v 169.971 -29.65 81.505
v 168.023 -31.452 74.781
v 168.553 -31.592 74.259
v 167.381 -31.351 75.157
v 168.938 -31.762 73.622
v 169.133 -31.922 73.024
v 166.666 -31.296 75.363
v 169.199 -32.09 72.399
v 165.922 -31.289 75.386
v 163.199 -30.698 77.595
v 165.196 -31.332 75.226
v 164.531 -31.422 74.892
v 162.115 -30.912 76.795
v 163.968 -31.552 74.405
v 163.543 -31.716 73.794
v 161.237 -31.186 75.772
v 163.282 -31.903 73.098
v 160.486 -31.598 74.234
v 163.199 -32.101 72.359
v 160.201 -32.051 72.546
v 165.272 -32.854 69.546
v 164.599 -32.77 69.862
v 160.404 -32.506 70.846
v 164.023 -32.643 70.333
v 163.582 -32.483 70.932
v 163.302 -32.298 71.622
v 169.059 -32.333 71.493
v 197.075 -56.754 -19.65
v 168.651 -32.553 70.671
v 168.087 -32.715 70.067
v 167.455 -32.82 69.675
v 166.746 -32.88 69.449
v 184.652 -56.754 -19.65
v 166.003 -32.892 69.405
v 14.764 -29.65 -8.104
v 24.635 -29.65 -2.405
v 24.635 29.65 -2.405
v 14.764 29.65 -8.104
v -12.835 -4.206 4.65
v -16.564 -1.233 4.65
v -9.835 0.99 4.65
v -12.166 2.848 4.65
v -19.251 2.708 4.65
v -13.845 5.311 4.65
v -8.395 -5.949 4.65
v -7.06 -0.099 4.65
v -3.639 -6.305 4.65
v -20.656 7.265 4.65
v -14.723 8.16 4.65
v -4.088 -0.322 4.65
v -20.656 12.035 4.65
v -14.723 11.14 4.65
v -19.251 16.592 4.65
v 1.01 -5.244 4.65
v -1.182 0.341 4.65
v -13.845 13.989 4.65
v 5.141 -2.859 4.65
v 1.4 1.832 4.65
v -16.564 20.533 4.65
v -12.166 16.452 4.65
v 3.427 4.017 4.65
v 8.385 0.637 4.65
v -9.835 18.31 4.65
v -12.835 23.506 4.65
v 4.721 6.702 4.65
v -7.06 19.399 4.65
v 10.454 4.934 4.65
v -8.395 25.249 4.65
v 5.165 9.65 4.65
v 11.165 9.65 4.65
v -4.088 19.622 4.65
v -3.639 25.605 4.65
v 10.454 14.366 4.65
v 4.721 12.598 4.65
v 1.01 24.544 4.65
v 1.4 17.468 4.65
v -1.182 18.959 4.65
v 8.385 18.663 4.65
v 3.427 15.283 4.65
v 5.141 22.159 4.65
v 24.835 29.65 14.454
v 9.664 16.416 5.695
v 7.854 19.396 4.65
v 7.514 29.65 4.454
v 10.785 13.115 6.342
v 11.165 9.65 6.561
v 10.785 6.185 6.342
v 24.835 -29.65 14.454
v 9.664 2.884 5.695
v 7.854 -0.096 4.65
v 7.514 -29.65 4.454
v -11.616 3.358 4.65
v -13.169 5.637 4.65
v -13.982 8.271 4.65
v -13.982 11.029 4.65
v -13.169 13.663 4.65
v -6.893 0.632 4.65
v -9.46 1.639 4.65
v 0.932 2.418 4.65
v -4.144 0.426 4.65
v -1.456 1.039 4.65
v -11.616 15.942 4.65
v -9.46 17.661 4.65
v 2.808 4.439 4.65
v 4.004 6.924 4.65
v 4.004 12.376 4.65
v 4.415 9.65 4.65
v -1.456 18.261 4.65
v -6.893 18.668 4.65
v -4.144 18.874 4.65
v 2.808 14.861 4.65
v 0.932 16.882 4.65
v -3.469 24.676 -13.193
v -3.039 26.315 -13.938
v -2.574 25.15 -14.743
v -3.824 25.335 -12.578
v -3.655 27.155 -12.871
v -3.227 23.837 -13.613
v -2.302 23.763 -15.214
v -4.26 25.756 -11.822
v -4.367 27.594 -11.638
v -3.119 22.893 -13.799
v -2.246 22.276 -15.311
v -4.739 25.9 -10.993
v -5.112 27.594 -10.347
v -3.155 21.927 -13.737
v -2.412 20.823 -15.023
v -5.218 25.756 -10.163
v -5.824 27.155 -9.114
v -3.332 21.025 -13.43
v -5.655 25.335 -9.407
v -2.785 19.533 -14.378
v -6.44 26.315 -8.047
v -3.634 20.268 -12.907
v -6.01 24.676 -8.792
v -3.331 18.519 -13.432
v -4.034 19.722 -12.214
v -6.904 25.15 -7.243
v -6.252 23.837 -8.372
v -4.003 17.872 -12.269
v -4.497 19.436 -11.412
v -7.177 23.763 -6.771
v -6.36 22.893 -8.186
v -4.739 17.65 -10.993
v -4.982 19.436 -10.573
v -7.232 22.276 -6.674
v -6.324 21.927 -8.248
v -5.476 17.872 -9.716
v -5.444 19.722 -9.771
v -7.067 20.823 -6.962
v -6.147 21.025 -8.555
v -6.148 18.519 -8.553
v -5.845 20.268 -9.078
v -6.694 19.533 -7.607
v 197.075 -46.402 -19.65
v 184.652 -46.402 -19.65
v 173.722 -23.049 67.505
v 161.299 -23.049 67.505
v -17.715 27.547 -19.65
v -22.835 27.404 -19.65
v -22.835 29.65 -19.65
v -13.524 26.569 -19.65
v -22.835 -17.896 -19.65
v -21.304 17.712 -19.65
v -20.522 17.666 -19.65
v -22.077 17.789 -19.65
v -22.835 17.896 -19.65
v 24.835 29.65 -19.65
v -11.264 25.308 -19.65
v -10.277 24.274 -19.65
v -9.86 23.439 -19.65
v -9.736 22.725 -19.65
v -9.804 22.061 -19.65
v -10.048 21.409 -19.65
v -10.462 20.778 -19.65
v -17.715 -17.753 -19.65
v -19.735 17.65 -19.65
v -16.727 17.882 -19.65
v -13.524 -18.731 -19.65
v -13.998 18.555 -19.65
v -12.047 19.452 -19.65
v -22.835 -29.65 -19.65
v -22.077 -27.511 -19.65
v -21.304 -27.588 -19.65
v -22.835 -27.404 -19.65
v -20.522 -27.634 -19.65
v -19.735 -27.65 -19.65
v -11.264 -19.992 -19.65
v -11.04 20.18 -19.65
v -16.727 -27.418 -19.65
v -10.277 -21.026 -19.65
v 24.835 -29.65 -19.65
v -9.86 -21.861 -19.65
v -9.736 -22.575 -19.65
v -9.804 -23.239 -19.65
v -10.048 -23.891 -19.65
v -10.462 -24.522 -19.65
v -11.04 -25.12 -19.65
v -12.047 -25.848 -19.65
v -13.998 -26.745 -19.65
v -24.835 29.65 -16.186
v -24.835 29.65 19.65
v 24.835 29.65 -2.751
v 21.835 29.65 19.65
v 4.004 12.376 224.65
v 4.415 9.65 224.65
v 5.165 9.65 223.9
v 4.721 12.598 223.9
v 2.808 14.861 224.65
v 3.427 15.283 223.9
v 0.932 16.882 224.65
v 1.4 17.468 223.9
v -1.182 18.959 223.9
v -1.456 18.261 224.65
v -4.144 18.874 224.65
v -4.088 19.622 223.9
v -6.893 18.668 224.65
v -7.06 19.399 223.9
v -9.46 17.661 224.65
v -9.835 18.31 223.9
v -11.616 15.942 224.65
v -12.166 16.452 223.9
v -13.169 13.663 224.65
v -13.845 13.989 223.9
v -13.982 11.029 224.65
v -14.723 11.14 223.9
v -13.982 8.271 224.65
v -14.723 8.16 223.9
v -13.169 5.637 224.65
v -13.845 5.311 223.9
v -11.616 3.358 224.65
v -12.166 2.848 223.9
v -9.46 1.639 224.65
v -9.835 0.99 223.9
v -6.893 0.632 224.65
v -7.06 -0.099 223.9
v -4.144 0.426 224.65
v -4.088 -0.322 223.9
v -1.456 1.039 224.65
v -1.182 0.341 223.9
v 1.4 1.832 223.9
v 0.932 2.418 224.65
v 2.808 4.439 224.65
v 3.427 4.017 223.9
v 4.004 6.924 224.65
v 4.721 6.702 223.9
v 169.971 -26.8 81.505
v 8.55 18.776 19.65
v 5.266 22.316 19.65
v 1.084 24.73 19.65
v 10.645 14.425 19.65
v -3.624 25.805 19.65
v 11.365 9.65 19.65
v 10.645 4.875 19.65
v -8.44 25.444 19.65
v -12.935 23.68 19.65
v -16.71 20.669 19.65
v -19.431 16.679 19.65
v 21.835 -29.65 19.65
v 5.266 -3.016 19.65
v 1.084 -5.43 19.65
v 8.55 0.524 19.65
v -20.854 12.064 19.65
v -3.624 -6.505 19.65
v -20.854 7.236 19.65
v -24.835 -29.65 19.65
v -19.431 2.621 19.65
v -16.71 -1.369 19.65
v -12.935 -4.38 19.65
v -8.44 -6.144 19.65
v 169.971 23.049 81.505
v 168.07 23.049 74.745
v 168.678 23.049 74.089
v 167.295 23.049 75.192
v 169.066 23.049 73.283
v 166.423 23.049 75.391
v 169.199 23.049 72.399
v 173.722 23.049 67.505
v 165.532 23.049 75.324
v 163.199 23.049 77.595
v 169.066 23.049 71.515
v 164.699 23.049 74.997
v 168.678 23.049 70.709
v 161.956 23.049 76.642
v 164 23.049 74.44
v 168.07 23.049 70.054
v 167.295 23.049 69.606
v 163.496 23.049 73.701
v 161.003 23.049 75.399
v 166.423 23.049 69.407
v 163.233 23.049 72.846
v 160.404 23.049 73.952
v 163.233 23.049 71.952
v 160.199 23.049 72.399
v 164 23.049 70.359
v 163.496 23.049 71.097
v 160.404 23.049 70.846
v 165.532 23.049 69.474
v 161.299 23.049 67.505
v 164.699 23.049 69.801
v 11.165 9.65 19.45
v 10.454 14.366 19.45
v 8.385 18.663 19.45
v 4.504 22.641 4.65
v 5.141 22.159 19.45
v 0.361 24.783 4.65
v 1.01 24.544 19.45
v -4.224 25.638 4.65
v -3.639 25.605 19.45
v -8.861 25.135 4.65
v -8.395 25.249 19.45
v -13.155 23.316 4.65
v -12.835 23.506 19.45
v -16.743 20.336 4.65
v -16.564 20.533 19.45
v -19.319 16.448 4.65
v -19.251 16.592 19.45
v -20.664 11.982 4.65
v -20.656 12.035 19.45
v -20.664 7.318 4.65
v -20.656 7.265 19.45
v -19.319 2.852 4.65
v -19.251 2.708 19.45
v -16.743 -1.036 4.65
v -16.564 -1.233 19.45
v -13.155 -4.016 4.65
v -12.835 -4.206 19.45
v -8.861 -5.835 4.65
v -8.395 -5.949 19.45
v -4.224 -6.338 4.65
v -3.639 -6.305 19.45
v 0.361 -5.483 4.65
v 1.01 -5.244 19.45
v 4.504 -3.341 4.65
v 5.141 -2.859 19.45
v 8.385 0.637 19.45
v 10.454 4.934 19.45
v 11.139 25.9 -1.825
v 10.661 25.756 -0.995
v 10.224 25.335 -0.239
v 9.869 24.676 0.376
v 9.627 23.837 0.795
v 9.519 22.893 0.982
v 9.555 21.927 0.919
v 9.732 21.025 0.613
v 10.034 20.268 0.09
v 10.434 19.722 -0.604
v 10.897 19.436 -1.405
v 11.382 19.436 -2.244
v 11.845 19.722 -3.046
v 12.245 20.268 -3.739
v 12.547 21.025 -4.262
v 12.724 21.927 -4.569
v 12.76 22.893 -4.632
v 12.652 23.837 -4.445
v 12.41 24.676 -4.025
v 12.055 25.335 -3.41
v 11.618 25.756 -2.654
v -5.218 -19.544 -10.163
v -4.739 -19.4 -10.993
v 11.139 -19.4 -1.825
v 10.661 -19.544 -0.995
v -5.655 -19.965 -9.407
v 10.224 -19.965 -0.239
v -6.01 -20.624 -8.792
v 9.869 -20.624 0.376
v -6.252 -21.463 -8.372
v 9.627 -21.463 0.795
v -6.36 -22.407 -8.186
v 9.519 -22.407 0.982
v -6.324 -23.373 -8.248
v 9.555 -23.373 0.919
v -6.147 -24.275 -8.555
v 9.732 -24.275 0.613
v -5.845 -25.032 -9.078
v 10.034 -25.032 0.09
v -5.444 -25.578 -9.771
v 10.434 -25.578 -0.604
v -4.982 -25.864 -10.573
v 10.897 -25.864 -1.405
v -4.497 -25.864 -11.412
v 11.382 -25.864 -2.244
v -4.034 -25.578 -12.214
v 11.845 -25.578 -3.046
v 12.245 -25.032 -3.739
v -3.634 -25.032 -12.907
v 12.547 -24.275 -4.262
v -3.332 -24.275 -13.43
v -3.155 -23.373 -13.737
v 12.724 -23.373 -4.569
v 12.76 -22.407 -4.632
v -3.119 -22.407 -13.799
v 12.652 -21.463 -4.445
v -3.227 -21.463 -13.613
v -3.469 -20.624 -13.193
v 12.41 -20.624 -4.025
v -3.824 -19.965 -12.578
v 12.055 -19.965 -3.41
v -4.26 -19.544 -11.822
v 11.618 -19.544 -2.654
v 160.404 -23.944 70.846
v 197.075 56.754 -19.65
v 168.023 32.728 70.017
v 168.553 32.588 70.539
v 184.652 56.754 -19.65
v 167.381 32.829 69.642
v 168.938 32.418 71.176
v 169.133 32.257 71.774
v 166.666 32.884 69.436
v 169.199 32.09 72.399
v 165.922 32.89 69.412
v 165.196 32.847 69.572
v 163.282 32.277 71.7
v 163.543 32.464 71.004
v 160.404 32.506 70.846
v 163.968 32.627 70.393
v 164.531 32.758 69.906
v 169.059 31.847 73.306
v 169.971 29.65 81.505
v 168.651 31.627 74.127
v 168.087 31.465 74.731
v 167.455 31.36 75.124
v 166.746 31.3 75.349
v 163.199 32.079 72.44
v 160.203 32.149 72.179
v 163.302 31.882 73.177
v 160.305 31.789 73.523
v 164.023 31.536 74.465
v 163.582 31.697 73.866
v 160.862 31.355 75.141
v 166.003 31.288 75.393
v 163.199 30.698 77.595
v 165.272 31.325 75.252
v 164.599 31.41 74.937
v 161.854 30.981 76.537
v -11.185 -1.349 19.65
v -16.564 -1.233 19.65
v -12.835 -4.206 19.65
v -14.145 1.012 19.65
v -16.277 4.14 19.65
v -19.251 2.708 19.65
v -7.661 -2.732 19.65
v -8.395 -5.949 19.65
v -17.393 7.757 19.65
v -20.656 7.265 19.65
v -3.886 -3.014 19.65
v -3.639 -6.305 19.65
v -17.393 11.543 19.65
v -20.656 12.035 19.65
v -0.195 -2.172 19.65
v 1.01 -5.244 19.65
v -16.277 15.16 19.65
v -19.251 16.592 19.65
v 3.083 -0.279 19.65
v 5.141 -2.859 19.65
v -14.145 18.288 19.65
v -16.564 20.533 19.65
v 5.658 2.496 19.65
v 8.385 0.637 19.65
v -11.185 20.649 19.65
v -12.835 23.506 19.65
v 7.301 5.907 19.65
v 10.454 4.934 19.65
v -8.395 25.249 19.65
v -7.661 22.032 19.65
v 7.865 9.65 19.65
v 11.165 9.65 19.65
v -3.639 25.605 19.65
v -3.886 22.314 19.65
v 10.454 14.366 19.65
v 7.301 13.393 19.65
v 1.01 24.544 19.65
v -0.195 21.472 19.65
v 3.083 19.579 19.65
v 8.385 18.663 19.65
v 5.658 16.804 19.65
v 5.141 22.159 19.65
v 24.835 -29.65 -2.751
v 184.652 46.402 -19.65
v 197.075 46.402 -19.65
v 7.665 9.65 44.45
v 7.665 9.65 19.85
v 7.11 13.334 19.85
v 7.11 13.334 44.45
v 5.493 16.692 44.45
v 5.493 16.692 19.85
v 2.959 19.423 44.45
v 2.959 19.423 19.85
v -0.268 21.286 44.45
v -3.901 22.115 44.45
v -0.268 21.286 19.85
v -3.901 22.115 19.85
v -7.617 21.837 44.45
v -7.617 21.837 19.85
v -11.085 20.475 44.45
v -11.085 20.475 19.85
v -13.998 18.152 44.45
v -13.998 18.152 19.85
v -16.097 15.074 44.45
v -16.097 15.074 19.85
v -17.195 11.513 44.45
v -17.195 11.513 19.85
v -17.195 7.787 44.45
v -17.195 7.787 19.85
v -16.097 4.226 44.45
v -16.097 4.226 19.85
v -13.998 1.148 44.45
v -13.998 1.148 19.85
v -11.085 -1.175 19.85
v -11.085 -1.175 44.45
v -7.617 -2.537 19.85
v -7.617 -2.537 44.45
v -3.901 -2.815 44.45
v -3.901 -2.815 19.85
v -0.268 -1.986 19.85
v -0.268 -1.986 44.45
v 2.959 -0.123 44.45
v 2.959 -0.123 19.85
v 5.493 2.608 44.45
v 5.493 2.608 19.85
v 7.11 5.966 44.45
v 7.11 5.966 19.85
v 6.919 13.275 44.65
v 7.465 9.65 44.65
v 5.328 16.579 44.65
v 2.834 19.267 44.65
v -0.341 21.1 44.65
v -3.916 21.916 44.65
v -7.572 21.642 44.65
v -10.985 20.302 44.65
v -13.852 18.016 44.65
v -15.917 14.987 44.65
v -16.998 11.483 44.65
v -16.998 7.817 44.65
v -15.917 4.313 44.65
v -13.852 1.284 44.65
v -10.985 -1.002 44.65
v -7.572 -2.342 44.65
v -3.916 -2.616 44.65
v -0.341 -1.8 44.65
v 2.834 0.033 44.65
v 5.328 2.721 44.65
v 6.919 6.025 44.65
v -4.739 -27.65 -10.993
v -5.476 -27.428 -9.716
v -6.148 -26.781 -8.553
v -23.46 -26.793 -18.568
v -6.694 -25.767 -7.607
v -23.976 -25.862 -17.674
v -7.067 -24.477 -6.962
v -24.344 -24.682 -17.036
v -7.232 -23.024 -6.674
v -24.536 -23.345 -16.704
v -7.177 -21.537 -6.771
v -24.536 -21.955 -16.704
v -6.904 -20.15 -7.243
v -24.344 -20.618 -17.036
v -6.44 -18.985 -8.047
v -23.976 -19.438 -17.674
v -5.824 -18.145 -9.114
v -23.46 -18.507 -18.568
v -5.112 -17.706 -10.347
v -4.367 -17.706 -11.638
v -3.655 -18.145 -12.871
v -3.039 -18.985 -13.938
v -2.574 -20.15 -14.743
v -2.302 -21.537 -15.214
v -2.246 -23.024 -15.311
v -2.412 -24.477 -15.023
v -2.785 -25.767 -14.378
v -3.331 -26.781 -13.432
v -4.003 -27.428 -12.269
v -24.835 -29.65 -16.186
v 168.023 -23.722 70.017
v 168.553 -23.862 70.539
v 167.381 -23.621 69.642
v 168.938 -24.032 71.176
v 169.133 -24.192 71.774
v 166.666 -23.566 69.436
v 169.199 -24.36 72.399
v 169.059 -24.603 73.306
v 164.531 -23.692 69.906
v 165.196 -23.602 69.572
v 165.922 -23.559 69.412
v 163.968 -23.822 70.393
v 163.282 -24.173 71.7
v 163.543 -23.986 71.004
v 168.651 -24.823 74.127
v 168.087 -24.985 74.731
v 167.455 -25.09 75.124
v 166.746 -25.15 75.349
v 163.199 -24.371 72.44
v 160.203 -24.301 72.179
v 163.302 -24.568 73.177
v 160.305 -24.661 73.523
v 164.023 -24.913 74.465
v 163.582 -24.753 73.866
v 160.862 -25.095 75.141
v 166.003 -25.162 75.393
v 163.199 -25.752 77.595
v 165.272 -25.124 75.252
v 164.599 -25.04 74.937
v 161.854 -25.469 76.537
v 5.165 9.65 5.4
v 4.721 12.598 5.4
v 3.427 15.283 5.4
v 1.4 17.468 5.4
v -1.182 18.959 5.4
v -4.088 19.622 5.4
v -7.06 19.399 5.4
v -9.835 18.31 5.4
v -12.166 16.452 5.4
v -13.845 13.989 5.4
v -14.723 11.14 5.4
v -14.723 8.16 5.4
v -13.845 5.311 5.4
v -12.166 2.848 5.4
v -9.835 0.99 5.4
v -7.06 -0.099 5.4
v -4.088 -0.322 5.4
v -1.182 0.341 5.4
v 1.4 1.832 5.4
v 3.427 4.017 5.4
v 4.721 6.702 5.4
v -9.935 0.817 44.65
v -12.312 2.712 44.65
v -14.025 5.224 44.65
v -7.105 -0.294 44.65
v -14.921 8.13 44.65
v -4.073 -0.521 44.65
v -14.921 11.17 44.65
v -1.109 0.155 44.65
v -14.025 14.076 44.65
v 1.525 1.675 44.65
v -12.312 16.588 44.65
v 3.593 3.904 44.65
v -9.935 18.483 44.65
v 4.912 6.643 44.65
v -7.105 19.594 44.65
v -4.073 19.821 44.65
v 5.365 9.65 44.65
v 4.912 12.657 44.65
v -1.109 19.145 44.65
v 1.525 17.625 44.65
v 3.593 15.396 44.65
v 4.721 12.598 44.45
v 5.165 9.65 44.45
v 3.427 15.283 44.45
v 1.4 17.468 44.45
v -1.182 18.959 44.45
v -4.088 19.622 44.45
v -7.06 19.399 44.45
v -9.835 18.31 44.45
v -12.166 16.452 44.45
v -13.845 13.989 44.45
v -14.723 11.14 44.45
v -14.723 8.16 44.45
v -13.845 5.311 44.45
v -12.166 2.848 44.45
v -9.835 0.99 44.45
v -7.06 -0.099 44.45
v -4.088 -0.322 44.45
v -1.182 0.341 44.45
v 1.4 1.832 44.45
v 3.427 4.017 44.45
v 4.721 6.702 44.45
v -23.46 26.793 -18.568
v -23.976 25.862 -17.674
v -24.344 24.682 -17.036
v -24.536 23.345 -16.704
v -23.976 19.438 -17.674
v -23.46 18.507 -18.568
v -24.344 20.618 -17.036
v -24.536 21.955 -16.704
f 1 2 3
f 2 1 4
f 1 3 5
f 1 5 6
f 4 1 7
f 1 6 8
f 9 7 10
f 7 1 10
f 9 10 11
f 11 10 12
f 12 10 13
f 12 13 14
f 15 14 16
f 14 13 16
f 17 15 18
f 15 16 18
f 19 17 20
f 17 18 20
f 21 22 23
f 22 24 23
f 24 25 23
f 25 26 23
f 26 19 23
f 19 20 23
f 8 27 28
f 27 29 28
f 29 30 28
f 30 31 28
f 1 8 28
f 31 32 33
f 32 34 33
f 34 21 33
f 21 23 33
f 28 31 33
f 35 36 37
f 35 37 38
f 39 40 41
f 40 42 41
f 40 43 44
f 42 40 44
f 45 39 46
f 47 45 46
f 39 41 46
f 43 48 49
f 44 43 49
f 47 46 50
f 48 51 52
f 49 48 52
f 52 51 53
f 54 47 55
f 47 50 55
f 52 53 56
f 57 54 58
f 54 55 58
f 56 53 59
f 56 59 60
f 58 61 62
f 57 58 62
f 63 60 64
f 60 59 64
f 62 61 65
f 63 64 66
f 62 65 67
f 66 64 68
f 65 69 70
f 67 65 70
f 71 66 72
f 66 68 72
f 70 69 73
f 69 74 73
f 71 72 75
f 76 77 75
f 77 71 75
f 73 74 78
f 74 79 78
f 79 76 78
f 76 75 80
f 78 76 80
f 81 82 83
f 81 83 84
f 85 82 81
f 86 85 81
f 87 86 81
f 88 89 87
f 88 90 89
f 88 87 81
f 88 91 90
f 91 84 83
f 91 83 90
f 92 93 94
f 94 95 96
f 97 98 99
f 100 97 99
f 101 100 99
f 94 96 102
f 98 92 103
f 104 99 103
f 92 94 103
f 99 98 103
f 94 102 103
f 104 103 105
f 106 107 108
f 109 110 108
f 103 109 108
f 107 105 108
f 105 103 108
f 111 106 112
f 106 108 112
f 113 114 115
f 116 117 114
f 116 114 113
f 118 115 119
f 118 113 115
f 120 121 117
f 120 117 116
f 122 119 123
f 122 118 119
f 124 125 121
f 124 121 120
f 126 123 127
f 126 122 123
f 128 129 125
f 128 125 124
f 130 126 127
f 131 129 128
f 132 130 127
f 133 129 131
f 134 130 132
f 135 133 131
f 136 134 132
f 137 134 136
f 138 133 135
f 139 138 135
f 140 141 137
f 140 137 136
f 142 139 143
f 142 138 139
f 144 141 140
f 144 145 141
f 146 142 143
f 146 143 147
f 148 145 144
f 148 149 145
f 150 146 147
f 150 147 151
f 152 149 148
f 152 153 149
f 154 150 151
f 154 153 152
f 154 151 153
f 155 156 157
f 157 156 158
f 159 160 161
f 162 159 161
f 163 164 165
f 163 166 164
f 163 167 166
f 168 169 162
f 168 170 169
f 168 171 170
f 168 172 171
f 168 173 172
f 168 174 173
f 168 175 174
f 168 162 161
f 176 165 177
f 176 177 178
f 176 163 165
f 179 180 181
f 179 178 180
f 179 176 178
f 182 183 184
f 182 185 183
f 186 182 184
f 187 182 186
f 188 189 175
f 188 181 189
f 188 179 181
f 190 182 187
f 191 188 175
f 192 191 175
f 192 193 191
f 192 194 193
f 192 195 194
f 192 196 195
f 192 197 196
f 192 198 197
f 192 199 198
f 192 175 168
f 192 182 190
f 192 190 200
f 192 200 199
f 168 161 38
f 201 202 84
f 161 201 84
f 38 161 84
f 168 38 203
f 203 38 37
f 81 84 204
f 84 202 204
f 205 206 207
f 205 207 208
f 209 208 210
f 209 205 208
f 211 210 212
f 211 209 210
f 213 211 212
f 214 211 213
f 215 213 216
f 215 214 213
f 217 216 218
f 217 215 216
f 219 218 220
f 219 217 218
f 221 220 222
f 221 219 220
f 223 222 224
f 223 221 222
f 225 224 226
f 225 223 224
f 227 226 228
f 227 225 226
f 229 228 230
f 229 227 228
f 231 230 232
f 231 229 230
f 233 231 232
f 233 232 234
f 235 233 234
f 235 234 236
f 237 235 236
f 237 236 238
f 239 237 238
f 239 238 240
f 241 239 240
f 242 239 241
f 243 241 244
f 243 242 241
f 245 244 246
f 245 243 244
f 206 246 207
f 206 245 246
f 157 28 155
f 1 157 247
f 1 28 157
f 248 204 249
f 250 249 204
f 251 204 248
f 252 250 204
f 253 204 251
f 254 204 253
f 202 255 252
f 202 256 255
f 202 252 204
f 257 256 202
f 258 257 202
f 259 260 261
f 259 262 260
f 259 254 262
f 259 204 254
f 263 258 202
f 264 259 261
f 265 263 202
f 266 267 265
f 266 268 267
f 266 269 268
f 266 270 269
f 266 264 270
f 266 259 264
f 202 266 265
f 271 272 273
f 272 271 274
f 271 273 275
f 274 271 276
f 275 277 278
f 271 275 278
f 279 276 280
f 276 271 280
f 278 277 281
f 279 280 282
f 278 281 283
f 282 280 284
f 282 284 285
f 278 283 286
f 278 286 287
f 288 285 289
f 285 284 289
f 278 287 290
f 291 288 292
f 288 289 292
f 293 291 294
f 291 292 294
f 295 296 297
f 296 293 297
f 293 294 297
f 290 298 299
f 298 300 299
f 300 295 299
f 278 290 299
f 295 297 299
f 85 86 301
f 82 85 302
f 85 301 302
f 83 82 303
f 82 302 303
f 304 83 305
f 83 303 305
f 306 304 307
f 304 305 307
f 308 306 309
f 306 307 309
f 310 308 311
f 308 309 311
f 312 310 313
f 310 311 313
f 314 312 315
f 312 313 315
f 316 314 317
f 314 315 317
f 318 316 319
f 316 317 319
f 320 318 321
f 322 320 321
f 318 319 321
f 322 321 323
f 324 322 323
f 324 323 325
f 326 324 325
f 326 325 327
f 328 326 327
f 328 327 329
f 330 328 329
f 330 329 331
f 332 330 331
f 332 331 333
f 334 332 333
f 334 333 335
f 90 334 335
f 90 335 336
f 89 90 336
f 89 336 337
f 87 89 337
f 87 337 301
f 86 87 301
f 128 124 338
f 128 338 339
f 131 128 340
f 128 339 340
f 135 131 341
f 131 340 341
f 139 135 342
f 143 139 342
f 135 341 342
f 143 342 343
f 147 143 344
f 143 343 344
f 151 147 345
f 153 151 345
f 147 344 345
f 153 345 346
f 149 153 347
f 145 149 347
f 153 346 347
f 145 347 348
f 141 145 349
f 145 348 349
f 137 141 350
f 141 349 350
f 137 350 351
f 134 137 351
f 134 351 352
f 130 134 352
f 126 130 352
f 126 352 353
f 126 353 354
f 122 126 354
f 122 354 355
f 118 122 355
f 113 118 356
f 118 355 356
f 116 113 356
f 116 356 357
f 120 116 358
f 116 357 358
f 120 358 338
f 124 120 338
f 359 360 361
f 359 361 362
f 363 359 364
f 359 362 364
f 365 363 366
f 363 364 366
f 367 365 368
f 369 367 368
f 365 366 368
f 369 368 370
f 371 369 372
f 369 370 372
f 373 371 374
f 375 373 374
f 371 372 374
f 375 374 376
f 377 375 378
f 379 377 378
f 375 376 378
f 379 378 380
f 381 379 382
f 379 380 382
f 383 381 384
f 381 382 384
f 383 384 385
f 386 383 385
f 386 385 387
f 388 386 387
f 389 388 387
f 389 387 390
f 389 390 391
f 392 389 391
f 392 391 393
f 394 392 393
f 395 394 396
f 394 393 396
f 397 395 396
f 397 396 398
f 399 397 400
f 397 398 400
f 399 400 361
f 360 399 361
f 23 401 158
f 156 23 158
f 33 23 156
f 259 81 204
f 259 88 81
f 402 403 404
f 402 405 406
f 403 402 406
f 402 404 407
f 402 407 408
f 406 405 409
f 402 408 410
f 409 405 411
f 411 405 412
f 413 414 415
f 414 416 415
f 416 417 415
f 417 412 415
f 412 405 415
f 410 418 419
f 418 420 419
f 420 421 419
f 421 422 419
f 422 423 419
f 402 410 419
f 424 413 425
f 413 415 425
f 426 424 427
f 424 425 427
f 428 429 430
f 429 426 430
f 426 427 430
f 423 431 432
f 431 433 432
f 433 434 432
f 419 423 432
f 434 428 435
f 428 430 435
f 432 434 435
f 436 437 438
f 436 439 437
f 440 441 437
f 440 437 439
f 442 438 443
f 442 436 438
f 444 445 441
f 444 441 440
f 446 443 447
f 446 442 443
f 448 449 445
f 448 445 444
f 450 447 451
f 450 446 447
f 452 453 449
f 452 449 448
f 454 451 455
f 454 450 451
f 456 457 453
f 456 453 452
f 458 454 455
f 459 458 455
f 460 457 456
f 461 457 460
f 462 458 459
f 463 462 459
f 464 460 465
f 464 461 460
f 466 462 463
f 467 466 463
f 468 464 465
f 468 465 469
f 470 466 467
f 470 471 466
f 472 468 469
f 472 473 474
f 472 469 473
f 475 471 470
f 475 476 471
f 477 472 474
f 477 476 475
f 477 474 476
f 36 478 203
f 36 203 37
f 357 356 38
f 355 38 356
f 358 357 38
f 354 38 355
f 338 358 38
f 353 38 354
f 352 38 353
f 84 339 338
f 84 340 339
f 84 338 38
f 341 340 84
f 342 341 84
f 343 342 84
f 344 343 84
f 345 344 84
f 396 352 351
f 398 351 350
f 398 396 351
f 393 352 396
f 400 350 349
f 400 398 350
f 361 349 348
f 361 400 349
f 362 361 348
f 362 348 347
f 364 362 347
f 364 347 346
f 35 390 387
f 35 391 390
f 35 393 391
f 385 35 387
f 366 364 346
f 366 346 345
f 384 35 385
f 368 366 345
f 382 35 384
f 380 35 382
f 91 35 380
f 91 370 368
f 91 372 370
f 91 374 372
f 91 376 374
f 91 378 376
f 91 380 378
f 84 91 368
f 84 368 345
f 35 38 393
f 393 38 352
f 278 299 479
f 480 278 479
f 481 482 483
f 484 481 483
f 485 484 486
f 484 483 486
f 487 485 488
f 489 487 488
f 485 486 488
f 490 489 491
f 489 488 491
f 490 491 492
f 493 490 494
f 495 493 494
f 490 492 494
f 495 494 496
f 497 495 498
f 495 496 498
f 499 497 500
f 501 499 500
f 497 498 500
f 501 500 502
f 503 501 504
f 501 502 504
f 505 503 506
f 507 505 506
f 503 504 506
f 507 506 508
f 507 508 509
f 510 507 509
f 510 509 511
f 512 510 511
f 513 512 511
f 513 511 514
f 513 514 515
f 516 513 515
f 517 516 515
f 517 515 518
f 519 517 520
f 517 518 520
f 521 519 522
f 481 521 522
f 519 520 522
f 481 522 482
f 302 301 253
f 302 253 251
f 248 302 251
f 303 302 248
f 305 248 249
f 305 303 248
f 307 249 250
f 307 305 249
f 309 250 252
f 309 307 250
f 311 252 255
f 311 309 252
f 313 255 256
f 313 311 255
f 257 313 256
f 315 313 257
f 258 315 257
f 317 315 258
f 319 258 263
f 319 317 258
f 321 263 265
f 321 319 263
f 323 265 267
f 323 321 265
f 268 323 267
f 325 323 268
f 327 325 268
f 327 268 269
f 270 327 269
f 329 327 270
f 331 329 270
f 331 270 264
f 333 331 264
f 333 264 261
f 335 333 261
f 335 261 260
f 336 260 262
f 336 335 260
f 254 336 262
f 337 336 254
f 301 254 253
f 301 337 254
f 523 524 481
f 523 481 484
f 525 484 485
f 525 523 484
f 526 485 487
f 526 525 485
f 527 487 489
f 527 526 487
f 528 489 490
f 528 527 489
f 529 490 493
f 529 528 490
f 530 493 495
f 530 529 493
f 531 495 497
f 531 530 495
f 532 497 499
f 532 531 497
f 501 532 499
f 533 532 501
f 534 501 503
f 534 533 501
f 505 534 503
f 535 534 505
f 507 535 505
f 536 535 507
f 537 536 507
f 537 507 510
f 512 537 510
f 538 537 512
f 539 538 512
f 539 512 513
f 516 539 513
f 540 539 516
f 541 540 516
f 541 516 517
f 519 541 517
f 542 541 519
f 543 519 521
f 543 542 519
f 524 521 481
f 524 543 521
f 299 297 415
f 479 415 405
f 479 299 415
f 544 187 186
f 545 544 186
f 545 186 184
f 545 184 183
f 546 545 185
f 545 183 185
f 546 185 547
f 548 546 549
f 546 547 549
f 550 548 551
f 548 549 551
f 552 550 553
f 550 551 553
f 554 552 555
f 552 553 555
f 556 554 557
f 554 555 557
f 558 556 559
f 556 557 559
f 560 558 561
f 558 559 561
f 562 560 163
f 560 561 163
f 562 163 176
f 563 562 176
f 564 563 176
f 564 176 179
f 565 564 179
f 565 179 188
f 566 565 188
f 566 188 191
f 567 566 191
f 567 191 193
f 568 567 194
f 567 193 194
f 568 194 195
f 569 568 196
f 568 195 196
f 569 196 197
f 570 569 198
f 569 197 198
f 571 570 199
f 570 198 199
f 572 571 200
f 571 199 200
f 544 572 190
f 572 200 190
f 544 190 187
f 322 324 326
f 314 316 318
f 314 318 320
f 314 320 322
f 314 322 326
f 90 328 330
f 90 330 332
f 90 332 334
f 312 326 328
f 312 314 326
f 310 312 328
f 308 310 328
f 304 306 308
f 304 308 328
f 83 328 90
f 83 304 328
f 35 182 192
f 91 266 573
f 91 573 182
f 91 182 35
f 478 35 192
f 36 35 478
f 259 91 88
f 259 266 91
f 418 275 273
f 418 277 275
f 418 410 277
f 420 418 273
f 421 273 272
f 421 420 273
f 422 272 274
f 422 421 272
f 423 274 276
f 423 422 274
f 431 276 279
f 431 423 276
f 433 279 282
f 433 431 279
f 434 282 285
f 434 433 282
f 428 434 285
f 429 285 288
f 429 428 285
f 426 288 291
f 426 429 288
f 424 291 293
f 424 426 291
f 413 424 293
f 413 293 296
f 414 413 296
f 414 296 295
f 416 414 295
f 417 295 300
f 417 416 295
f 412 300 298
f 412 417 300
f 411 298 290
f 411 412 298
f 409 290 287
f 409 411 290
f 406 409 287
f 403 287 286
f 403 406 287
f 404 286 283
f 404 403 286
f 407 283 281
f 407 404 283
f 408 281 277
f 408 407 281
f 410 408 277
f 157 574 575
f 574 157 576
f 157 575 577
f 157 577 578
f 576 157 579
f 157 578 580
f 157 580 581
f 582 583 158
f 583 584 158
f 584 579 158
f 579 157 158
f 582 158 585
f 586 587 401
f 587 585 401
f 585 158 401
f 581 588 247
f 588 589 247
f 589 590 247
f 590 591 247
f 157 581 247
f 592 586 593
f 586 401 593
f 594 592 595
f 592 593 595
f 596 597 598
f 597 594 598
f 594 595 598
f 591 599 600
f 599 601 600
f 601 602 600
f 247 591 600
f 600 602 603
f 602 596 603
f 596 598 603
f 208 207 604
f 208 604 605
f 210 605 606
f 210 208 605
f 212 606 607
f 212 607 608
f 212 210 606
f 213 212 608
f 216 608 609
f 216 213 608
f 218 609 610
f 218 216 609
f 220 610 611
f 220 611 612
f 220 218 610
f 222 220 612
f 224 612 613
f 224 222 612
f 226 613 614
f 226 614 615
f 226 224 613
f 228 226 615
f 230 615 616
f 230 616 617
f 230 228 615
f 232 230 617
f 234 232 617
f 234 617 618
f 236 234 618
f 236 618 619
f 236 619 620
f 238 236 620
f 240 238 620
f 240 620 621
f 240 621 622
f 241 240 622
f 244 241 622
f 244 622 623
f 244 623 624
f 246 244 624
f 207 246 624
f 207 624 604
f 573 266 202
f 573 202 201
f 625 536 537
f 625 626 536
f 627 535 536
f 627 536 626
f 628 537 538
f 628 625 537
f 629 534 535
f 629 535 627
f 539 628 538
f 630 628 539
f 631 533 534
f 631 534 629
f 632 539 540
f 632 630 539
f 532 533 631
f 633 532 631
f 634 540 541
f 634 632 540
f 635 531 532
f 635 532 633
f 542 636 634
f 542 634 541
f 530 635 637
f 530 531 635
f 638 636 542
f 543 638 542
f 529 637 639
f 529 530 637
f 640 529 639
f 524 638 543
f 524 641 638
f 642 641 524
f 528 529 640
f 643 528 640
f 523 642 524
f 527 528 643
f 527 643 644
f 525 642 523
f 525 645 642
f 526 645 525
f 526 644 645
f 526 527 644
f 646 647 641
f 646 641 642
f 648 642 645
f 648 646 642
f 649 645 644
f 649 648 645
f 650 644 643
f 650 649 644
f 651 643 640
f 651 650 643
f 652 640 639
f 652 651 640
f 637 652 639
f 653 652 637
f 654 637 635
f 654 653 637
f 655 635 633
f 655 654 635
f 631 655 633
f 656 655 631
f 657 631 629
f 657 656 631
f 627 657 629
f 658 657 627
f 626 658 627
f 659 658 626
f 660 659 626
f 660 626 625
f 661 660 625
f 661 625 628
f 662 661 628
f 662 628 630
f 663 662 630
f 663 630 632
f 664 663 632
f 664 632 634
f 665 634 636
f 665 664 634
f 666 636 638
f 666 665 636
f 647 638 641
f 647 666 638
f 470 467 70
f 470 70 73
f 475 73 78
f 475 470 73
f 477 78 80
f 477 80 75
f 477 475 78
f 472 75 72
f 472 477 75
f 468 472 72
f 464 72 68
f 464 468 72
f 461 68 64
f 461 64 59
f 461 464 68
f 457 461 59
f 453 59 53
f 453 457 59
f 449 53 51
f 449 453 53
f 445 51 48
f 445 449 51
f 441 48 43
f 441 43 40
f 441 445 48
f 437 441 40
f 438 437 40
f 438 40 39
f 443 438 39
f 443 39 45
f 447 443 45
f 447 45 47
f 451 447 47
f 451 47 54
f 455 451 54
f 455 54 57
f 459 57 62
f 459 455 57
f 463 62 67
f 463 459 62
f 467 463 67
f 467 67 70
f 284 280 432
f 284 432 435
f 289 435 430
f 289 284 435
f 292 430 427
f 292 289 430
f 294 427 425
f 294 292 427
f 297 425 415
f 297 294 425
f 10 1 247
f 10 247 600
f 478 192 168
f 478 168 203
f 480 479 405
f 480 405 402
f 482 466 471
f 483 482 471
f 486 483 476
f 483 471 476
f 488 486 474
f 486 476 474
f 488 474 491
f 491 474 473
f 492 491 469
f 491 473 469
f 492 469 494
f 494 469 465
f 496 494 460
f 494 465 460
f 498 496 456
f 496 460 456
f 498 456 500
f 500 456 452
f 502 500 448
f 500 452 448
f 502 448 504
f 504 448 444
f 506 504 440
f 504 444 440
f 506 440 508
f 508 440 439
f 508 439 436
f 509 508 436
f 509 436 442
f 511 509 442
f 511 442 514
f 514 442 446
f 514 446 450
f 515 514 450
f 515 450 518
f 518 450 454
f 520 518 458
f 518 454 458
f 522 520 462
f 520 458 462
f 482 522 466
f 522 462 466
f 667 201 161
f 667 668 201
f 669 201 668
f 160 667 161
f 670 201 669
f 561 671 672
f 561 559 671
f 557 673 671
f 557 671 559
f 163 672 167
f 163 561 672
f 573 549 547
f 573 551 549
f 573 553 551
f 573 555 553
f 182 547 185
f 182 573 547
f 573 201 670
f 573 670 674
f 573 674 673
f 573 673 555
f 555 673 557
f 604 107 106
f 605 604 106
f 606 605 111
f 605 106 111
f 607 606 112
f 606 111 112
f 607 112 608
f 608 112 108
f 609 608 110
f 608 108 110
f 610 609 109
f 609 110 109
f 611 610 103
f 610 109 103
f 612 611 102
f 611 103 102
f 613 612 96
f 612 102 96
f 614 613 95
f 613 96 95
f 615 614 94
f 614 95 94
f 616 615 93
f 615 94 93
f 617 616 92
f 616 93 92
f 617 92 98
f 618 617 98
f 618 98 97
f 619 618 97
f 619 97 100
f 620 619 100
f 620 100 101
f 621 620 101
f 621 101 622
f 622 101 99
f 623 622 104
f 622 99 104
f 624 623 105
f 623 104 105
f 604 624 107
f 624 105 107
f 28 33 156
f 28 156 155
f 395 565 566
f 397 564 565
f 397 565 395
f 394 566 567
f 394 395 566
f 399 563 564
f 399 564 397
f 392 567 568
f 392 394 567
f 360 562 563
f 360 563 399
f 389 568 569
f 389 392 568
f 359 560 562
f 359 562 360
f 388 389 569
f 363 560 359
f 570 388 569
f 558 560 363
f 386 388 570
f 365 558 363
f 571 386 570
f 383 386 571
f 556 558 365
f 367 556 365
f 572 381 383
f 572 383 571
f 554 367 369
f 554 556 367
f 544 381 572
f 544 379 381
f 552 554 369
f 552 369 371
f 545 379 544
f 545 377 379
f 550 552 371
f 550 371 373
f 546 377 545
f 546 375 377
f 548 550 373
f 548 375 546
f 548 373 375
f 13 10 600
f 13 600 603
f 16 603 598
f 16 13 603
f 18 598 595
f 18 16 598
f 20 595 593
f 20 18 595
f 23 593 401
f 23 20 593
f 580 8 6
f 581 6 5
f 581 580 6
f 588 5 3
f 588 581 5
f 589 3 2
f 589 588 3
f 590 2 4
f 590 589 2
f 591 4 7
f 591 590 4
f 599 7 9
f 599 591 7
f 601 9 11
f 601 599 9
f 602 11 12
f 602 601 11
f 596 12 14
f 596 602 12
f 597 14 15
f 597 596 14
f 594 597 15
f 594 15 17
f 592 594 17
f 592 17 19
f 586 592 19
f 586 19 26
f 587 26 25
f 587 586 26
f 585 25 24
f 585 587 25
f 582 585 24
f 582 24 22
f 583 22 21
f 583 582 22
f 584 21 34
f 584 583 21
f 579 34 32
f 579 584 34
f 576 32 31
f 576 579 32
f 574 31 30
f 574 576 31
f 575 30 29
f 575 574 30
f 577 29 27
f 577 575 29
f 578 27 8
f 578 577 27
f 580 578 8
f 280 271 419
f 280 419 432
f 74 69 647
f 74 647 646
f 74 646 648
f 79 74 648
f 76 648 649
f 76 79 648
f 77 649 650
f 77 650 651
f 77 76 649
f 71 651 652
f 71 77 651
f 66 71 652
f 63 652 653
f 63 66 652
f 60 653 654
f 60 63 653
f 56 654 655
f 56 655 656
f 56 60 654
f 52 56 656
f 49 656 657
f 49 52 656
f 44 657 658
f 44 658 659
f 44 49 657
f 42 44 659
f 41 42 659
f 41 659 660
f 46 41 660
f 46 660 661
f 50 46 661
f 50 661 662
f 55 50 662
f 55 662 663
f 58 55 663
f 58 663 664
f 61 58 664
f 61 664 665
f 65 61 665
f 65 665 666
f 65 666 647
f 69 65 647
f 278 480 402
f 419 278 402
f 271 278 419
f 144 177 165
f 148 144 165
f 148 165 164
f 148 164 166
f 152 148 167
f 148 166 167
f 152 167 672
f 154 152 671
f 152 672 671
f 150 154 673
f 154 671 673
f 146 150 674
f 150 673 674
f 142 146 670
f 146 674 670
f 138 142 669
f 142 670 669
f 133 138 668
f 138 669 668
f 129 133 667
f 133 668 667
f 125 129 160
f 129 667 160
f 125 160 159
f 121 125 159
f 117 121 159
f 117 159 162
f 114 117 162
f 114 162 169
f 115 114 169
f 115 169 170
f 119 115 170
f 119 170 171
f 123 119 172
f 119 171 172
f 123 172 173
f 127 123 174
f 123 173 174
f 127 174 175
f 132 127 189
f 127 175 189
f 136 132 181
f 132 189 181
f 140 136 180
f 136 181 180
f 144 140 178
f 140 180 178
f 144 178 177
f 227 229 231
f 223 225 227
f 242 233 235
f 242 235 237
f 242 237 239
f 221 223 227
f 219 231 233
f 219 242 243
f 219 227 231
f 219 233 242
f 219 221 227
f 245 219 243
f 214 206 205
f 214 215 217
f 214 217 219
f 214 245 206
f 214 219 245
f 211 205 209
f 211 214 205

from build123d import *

# Parameters (mm, degrees)
F1_DEPTH       = 29.65
F3_D           = 6.5
F3_CBORE_D     = 10
F3_CBORE_DEPTH = 20
F4_R           = 16
F4_R_2         = 12.5
F4_R_3         = 10
F4_R_4         = 3
F5_DEPTH       = 15
F6_DEPTH       = 15
F7_DEPTH       = 25
F8_SIZE        = 0.2
F8_2_SIZE      = 0.2
F9_DEPTH       = 205
F9_DEPTH_BACK  = 15
F10_SIZE       = 0.75
F11_R          = 3
F12_DEPTH      = 60
F14_DEPTH      = 197.0761949335


with BuildPart() as f1:
    # F0 (on Front) → F1 (new body, symmetric)
    with BuildSketch(Plane.XZ):
        Polygon((24.835, 14.4538475773), (21.835, 19.65), (-24.835, 19.65), (-24.835, -16.1858983849), (-22.835, -19.65), (24.835, -19.65), (24.835, -2.7511904446), (24.635, -2.404780283), (14.7644919243, -8.1035207776), (7.5144919243, 4.4538475773), align=None)
    extrude(amount=F1_DEPTH, both=True)

    # F3 (through all)
    with Locations(Plane(origin=(-25.6349495922, 0, -14.8003450477), x_dir=(0, -1, 0), z_dir=(-0.8660254038, 0, -0.5))):
        with Locations((-22.65, -7.1501008156), (22.65, -7.1501008156)):
            CounterBoreHole(F3_D / 2, F3_CBORE_D / 2, F3_CBORE_DEPTH)

    # F4 (on face) → F5 (cut)
    with BuildSketch(Plane.XY.offset(19.65)):
        with Locations((-4.835, 9.65)):
            Circle(F4_R)
        with Locations((-4.835, 9.65)):
            Circle(F4_R_2, mode=Mode.SUBTRACT)
        with Locations((-4.835, 9.65)):
            Circle(F4_R_2)
        with Locations((-4.835, 9.65)):
            Circle(F4_R_3, mode=Mode.SUBTRACT)
        with Locations((-4.835, 9.65)):
            Circle(F4_R_3)
        with Locations((-4.835, 9.65)):
            Circle(F4_R_4, mode=Mode.SUBTRACT)
        with Locations((-4.835, 9.65)):
            Circle(F4_R_4)
    extrude(amount=-F5_DEPTH, mode=Mode.SUBTRACT)

    # F8#2
    f8_2_edges = [f1.edges().sort_by_distance(p)[0] for p in [
        (-20.835, 9.65, 19.65),
    ]]
    chamfer(f8_2_edges, length=F8_2_SIZE)


with BuildPart() as f6:
    # F4 (on face) → F6 (new body)
    with BuildSketch(Plane.XY.offset(19.65)):
        with Locations((-4.835, 9.65)):
            Circle(F4_R)
        with Locations((-4.835, 9.65)):
            Circle(F4_R_2, mode=Mode.SUBTRACT)
        with Locations((-4.835, 9.65)):
            Circle(F4_R_2)
        with Locations((-4.835, 9.65)):
            Circle(F4_R_3, mode=Mode.SUBTRACT)
    extrude(amount=-F6_DEPTH)

    # F4 (on face) → F7 (join)
    with BuildSketch(Plane.XY.offset(19.65)):
        with Locations((-4.835, 9.65)):
            Circle(F4_R_2)
        with Locations((-4.835, 9.65)):
            Circle(F4_R_3, mode=Mode.SUBTRACT)
    extrude(amount=F7_DEPTH)

    # F8
    f8_edges = [f6.edges().sort_by_distance(p)[0] for p in [
        (-17.335, 9.65, 44.65),
        (-14.835, 9.65, 44.65),
        (-17.335, 9.65, 19.65),
    ]]
    chamfer(f8_edges, length=F8_SIZE)


with BuildPart() as f9:
    # F4 (on face) → F9 (new body, two sides)
    with BuildSketch(Plane.XY.offset(19.65)) as f9_sk:
        with Locations((-4.835, 9.65)):
            Circle(F4_R_3)
        with Locations((-4.835, 9.65)):
            Circle(F4_R_4, mode=Mode.SUBTRACT)
        with Locations((-4.835, 9.65)):
            Circle(F4_R_4)
    extrude(amount=F9_DEPTH)
    extrude(f9_sk.sketch, amount=-F9_DEPTH_BACK)

    # F10
    f10_edges = [f9.edges().sort_by_distance(p)[0] for p in [
        (-14.835, 9.65, 224.65),
        (-14.835, 9.65, 4.65),
    ]]
    chamfer(f10_edges, length=F10_SIZE)


with BuildPart() as f12:
    # F11 (on Front) → F12 (new body, symmetric)
    with BuildSketch(Plane.XZ):
        with BuildLine():
            Line((197.0751949335, -19.65), (169.9708222839, 81.5048958355))
            Line((169.9708222839, 81.5048958355), (163.1990645561, 77.5952196885))
            ThreePointArc((163.1990645561, 77.5952196885), (160.6557873995, 74.6951678621), (160.4035096478, 70.8461530236))
            Line((160.4035096478, 70.8461530236), (184.6518807686, -19.65))
            Line((184.6518807686, -19.65), (197.0751949335, -19.65))
        make_face()
        with Locations((166.1990646055, 72.3990672942)):
            Circle(F11_R, mode=Mode.SUBTRACT)
    extrude(amount=F12_DEPTH, both=True)

    # F13 (on Right) → F14 (intersect, through all)
    with BuildSketch(Plane.YZ):
        Polygon((-56.7543726496, -19.65), (-46.4016108455, -19.65), (-23.0485268899, 67.5048958355), (-26.799815584, 81.5048958355), (-29.65, 81.5048958355), align=None)
        Polygon((23.0485268899, 67.5048958355), (46.4016108455, -19.65), (56.7543726496, -19.65), (29.65, 81.5048958355), (23.0485268899, 81.5048958355), align=None)
    extrude(amount=F14_DEPTH, mode=Mode.INTERSECT)


solid = Compound([f1.part, f6.part, f9.part, f12.part])
